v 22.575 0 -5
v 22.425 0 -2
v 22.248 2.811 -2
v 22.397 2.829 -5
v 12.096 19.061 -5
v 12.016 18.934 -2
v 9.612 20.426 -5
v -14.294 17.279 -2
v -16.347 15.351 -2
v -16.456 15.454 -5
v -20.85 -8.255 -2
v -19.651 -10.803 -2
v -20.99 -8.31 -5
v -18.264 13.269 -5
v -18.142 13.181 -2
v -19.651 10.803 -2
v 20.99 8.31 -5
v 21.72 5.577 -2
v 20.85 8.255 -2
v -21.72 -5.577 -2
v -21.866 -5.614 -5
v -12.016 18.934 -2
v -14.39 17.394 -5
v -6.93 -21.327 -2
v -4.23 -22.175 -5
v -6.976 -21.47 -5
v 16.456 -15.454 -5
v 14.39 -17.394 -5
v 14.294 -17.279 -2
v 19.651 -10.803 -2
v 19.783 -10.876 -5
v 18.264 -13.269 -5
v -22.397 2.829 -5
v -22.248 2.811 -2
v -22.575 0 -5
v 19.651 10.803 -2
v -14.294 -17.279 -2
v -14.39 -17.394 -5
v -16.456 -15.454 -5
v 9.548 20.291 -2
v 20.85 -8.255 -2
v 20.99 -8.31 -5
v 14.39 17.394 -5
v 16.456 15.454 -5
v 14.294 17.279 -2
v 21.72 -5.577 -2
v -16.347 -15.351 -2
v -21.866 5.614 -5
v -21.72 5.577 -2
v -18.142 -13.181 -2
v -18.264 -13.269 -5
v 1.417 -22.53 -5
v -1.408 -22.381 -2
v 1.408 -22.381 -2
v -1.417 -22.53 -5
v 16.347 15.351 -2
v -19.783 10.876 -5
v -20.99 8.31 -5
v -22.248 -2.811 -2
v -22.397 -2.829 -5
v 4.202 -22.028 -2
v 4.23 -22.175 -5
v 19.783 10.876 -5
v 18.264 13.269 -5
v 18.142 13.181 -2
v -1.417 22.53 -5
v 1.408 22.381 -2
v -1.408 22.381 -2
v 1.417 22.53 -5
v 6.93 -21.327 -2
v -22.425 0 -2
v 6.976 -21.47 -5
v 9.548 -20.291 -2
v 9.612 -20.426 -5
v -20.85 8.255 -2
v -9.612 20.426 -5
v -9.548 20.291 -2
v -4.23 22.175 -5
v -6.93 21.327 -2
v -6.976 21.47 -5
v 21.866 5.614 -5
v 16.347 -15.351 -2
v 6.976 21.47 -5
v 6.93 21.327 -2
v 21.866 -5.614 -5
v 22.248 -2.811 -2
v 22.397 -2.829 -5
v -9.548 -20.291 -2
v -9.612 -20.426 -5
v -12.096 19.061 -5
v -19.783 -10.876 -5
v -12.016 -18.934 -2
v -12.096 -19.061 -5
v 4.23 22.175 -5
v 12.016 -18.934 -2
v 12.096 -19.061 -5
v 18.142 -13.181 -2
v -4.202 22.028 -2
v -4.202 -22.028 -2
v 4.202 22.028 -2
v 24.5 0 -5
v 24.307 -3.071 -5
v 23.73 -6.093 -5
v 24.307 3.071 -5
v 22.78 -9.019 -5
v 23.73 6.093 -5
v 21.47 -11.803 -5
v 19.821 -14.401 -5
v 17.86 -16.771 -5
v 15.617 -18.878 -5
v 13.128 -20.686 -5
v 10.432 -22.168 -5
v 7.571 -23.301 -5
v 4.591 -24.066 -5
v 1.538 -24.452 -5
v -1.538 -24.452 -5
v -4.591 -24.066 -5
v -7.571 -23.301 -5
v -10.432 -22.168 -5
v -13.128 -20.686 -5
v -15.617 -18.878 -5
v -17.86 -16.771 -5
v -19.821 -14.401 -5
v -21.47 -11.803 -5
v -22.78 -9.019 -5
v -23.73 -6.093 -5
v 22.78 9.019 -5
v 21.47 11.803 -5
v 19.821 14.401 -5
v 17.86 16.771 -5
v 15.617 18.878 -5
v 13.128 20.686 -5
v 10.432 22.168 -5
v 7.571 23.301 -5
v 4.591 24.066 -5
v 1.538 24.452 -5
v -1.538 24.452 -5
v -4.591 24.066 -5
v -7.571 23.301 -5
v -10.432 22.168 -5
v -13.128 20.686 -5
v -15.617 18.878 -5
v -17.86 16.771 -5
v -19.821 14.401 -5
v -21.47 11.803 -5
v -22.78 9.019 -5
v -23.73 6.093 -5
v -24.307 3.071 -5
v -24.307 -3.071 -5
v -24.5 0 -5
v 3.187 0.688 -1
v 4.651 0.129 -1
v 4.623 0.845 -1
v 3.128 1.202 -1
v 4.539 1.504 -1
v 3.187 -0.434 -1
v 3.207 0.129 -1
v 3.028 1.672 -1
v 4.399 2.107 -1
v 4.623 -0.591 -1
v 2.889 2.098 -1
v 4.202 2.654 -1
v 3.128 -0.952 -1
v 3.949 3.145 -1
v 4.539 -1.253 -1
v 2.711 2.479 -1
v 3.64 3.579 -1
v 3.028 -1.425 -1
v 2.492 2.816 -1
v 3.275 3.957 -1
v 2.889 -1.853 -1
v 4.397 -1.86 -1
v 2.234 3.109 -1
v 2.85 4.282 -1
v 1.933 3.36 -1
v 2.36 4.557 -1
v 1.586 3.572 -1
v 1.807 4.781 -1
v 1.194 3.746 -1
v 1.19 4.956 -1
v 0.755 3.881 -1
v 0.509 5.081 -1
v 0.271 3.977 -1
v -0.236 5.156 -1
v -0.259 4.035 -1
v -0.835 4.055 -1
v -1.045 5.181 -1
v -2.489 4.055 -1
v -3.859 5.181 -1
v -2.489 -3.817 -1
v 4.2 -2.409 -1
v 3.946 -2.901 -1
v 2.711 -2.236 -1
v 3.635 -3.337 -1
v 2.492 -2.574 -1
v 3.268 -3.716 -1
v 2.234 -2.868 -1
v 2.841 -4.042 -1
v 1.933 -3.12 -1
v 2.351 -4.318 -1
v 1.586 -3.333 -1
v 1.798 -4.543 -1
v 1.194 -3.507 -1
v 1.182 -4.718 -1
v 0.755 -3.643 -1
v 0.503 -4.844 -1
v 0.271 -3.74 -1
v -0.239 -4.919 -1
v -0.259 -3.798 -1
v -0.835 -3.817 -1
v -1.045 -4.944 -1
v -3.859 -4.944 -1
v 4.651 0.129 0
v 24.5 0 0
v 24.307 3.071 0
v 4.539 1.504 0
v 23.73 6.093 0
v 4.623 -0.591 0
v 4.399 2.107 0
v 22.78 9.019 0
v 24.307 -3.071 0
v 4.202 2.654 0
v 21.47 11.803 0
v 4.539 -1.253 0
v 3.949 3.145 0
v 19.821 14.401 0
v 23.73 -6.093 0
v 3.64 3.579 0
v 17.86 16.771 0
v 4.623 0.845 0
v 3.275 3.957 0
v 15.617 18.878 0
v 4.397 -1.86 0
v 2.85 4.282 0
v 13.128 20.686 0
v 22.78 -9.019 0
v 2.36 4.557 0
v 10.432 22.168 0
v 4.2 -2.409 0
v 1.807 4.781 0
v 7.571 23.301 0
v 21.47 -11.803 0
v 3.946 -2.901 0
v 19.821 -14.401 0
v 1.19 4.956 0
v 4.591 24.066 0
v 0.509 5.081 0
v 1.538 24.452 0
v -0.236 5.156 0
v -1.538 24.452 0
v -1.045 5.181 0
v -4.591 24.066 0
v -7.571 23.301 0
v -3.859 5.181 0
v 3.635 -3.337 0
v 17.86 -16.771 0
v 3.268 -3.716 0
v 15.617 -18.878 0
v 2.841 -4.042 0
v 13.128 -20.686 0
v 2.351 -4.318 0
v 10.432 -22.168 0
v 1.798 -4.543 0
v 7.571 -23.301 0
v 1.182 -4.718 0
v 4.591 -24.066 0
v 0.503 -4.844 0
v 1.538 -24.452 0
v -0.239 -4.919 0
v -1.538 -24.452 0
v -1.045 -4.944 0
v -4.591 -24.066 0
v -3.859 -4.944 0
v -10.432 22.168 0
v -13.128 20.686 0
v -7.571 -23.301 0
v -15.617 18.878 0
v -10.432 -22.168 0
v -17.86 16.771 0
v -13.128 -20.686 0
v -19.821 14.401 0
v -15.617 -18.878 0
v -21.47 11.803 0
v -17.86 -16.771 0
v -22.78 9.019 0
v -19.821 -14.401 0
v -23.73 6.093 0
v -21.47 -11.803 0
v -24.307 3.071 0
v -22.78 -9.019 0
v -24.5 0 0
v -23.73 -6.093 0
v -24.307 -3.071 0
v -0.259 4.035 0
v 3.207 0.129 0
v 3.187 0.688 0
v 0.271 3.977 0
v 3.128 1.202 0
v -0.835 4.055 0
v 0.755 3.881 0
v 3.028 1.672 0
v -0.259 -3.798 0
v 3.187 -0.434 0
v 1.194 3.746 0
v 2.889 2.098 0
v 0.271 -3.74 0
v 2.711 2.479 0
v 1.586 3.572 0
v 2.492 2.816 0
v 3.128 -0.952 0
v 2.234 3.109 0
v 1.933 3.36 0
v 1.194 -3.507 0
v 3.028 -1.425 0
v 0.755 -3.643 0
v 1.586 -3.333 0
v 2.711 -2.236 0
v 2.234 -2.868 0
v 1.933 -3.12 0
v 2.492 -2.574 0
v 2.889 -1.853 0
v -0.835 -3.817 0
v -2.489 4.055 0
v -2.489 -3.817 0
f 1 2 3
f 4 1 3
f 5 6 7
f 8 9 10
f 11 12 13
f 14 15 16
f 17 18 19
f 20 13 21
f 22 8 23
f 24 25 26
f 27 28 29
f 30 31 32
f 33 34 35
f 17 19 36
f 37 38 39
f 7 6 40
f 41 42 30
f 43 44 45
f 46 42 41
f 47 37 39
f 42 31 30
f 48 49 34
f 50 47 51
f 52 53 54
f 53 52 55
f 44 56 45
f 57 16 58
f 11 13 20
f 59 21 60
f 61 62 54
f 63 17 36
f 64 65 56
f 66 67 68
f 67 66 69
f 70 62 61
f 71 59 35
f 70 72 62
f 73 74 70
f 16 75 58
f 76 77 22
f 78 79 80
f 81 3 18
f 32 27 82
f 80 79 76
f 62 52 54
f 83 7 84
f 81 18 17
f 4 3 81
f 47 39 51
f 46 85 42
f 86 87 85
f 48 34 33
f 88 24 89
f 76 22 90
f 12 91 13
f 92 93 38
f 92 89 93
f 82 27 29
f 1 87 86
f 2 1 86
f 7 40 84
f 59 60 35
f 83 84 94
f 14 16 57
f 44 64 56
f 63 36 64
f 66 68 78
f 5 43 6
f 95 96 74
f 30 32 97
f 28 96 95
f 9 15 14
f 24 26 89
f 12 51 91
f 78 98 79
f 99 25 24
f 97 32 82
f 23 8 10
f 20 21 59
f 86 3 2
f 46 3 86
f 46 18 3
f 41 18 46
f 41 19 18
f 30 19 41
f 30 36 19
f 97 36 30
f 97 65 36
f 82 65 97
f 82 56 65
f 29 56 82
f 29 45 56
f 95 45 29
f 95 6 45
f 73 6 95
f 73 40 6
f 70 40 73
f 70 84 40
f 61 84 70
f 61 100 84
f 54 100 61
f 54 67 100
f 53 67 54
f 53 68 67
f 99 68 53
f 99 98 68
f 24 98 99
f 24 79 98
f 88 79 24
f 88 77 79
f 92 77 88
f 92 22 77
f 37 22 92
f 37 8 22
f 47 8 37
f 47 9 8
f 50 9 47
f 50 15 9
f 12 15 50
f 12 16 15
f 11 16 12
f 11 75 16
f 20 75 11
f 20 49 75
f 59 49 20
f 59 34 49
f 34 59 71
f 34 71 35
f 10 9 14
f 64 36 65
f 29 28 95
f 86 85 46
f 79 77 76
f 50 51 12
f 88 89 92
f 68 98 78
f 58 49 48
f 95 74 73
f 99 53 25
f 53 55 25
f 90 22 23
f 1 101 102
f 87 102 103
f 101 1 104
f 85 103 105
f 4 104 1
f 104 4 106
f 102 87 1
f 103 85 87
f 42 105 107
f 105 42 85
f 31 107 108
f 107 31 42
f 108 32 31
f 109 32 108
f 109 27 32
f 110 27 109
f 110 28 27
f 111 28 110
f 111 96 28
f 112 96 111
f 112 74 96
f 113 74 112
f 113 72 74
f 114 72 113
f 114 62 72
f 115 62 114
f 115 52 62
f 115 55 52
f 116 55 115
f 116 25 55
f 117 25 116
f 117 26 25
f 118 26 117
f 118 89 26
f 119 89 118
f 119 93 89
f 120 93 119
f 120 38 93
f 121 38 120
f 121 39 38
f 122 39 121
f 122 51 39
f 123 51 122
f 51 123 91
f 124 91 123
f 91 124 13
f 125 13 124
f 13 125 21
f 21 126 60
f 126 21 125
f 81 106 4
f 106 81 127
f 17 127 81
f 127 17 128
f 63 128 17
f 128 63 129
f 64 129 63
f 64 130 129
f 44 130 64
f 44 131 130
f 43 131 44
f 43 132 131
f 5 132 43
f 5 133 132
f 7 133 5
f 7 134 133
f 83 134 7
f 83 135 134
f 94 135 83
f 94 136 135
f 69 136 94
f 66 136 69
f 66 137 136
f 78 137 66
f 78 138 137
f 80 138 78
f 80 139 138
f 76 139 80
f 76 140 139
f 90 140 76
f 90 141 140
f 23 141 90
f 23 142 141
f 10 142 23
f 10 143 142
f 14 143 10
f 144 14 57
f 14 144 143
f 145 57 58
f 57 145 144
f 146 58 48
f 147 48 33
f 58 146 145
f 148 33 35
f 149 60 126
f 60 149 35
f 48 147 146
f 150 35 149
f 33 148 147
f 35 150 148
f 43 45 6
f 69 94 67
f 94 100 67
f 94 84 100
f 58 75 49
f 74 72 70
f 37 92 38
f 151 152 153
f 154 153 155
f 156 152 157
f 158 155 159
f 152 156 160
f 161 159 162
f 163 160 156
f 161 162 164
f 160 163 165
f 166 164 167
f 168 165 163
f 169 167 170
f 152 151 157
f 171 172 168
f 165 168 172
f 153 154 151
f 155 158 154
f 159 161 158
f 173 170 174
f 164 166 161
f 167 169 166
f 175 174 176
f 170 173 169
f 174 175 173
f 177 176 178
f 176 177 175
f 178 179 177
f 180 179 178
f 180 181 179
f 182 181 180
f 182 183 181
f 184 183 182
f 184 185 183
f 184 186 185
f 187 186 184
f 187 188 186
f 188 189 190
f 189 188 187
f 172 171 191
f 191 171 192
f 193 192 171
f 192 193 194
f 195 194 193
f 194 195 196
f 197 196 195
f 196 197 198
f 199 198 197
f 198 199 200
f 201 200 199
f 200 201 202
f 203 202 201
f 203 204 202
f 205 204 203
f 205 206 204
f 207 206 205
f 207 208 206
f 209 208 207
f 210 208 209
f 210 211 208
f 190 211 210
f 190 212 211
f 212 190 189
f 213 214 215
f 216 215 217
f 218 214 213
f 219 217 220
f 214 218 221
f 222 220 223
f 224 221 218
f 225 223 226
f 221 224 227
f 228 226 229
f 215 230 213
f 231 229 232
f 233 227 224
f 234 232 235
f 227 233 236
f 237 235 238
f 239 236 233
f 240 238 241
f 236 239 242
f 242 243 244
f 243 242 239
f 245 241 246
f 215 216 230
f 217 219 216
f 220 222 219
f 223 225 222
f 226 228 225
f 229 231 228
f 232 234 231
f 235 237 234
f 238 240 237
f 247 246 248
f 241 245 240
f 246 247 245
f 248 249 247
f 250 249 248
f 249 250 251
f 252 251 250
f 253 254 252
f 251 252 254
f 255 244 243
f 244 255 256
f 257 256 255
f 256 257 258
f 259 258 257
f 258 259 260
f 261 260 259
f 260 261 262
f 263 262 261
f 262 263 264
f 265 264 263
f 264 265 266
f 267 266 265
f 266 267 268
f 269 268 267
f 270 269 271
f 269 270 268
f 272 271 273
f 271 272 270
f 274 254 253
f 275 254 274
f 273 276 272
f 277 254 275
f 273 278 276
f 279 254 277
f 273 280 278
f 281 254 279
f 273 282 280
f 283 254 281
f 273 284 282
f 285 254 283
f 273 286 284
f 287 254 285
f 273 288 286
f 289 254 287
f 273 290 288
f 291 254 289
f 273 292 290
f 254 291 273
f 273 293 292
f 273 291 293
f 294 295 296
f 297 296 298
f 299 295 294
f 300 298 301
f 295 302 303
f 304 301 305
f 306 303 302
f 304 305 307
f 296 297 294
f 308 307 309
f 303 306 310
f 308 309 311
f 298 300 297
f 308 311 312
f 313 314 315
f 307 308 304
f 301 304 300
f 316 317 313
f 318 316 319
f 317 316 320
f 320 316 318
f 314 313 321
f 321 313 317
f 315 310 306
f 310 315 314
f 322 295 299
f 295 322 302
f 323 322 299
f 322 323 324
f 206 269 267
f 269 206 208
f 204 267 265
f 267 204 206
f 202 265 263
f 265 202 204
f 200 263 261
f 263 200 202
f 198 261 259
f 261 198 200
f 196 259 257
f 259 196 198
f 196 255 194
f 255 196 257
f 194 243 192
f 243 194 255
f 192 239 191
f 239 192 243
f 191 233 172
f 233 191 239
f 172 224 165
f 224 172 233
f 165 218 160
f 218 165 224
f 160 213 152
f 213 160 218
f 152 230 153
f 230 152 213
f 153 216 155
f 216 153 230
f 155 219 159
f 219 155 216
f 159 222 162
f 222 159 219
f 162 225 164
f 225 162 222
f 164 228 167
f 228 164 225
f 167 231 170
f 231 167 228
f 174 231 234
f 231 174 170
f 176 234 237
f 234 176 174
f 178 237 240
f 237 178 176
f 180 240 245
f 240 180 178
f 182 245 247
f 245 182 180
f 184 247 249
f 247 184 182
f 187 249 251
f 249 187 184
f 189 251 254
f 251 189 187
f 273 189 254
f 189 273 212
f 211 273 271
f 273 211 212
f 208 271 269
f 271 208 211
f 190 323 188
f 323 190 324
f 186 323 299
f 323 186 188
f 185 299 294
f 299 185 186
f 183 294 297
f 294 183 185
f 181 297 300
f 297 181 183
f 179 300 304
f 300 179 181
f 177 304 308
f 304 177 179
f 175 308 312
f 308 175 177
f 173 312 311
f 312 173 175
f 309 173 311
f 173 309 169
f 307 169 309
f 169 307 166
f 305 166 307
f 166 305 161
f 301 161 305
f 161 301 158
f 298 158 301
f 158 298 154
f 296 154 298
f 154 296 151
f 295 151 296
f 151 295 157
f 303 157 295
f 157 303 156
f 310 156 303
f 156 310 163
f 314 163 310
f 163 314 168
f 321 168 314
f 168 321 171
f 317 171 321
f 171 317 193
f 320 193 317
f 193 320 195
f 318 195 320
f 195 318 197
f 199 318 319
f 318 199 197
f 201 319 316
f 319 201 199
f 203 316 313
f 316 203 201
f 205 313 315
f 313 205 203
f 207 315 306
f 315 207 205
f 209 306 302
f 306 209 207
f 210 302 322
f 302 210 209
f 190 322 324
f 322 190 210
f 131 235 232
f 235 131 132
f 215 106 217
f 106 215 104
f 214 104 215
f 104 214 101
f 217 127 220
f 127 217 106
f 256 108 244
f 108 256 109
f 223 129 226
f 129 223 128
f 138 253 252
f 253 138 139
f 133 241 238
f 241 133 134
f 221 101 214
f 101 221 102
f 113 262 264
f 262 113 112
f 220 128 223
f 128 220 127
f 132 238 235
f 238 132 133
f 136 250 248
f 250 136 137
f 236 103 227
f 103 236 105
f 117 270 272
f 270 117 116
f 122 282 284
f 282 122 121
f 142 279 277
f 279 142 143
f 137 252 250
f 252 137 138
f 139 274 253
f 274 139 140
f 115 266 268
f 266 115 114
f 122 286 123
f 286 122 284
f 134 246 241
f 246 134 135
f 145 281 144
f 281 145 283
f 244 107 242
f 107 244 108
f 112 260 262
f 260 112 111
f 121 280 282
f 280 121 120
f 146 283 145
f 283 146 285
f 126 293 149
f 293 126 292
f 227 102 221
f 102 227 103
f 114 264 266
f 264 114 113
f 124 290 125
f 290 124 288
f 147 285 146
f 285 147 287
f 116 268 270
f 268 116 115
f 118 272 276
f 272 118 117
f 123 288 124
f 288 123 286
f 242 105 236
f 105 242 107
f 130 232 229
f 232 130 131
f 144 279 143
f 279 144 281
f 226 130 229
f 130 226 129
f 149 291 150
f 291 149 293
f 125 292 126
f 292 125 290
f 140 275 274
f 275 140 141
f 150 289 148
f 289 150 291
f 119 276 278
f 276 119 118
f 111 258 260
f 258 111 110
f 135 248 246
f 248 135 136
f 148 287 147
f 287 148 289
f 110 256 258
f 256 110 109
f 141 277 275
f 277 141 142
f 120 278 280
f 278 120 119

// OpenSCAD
$fn = 50;

difference() {
	union() {
		translate(v = [0, 0, -5.0]) {
			cylinder(h = 5, r = 24.5);
		}
	}
	union() {
		#translate(v = [0, 0, -5.0]) {
			cylinder(h = 3, r1 = 22.575, r2 = 22.425);
		}
		translate(v = [0, 0, -1]) {
			linear_extrude(height = 1) {
				text(font = "Impact", halign = "center", size = 10, text = "D", valign = "center");
			}
		}
	}
}
